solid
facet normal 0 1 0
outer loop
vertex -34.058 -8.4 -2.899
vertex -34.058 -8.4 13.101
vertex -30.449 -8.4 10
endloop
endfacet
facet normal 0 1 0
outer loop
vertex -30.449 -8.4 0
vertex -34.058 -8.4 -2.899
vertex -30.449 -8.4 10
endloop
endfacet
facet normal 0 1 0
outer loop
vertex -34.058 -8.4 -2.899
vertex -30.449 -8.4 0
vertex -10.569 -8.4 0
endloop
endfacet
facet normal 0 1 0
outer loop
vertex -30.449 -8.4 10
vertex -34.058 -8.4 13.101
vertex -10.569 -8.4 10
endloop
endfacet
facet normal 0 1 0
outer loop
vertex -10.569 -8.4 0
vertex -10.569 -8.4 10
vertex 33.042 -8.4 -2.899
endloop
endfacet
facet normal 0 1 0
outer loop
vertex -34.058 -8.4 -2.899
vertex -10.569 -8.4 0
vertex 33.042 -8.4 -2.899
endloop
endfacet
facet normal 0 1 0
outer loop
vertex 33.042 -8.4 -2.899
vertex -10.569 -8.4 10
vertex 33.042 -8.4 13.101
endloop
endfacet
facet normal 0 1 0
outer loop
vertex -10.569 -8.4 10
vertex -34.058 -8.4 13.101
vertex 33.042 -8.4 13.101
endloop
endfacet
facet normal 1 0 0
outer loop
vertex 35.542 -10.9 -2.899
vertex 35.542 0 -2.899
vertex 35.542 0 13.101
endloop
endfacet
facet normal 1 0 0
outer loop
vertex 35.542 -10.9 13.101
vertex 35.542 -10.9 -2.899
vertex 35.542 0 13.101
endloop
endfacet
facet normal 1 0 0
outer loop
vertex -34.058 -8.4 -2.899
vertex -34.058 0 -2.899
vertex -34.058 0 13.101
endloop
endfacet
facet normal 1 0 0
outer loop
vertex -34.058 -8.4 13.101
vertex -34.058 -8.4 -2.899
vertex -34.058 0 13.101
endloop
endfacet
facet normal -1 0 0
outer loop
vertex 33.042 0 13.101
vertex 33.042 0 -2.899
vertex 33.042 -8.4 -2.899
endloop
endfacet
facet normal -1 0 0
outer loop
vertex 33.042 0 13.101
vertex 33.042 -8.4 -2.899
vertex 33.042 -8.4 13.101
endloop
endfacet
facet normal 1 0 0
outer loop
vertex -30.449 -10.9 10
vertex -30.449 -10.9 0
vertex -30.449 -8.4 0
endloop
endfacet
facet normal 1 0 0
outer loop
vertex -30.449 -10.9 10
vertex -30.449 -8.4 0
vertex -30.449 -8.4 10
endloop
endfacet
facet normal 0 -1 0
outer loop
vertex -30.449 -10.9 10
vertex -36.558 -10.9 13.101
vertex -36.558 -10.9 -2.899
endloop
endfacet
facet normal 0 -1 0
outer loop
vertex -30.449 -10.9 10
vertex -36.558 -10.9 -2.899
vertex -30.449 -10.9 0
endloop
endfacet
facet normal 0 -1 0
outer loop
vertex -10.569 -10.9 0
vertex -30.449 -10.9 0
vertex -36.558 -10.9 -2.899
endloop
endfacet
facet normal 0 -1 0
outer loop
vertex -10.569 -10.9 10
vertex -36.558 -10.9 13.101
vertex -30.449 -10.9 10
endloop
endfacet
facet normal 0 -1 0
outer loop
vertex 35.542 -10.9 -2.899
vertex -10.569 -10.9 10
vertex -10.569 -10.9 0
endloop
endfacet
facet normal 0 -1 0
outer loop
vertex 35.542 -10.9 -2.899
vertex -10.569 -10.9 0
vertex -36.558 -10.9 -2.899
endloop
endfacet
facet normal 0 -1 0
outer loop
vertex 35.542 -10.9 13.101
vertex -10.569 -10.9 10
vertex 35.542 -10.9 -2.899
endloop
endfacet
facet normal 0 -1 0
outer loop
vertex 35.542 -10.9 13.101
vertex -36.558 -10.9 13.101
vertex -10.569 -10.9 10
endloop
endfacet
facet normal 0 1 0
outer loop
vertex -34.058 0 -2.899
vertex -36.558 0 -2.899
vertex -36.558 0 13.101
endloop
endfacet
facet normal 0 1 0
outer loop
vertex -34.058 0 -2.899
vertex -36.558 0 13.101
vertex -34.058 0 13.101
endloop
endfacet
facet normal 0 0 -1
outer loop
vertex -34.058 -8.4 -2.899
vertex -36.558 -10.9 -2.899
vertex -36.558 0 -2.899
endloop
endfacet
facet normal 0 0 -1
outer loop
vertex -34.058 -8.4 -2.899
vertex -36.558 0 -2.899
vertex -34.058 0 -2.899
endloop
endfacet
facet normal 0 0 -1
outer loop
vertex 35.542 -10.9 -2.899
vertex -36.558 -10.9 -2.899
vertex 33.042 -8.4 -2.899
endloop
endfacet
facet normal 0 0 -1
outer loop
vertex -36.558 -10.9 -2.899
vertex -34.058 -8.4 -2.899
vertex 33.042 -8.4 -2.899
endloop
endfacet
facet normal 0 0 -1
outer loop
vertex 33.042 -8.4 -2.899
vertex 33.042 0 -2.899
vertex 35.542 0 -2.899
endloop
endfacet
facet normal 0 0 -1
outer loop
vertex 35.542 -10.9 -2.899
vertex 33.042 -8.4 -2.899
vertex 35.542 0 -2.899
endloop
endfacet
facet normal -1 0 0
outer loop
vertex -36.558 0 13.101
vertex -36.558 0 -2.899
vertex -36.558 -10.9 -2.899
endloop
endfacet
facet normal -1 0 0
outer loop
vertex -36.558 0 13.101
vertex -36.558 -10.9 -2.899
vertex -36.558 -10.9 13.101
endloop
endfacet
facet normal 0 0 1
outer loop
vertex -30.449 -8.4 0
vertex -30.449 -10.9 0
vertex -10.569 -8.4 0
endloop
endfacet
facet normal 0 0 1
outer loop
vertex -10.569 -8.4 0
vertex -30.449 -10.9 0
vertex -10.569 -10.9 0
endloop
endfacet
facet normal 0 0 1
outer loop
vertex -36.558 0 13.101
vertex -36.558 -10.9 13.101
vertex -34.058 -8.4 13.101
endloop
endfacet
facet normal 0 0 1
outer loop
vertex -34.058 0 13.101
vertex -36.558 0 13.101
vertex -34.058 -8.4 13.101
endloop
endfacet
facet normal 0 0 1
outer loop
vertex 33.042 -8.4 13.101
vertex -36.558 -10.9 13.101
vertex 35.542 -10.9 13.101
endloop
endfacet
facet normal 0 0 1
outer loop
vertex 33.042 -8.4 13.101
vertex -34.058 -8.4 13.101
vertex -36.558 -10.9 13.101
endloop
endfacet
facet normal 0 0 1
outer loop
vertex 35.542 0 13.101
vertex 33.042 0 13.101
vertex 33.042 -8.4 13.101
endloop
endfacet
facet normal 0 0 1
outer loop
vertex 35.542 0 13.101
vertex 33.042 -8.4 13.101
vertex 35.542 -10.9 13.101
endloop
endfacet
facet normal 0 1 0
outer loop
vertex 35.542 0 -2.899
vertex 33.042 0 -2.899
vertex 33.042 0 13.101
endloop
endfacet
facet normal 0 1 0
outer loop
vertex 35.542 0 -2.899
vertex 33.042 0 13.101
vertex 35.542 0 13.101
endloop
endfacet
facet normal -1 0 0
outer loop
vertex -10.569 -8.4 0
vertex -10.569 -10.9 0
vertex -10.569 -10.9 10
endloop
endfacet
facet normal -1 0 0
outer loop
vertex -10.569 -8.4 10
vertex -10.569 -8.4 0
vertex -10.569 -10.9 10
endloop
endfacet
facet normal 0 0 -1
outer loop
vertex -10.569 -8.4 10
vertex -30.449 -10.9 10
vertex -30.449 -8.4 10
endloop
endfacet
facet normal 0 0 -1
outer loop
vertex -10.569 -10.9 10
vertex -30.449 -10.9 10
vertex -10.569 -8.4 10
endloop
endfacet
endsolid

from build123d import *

# Parameters (mm, degrees)
F0_W     = 72.1
F0_H     = 16
F1_DEPTH = 10.9
F2_T     = -2.5
F3_W     = 19.88007
F3_H     = 10
F4_DEPTH = 25


with BuildPart() as f1:
    # F0 (on Front) → F1 (new body)
    with BuildSketch(Plane.XZ):
        with Locations((-0.508198, 5.101174)):
            Rectangle(F0_W, F0_H)
    extrude(amount=F1_DEPTH)

    # F2
    f2_openings = [f1.faces().sort_by_distance(p)[0] for p in [
        (-0.508198, 0, 5.101174),
        (-0.508198, -5.45, 13.101174),
        (-0.508198, -5.45, -2.898826),
    ]]
    offset(amount=F2_T, openings=f2_openings)

    # F3 (on face) → F4 (cut)
    with BuildSketch(Plane.XZ.offset(10.9)):
        with Locations((-20.508622, 5)):
            Rectangle(F3_W, F3_H)
    extrude(amount=-F4_DEPTH, mode=Mode.SUBTRACT)


solid = f1.part
